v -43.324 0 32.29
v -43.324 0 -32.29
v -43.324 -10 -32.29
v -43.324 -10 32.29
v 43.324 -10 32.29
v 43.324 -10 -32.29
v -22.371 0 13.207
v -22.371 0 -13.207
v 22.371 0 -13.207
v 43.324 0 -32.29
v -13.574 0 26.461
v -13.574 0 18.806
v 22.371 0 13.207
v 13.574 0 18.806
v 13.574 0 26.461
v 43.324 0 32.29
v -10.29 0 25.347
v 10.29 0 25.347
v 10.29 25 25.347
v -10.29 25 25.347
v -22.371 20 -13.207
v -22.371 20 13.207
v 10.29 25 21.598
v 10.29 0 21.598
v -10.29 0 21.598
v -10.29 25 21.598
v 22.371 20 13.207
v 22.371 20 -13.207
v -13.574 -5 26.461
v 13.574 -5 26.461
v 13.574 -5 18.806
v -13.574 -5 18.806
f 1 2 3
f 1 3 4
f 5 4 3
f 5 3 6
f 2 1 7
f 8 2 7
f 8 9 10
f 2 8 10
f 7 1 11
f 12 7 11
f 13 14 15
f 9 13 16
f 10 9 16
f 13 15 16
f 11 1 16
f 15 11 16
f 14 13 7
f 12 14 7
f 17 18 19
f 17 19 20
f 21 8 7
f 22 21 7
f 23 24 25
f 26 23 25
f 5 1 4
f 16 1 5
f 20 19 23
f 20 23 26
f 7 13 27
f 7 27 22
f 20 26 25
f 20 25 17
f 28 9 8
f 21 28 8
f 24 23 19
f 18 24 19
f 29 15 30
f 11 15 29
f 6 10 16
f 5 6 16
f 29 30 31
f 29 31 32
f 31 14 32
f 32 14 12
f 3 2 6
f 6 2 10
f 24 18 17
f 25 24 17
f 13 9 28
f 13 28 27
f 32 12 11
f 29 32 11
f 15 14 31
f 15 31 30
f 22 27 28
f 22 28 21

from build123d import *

# Parameters (mm, degrees)
F0_W     = 86.649
F0_H     = 64.58047
F1_DEPTH = 10
F2_W     = 27.147728
F2_H     = 7.65556
F3_DEPTH = 5
F4_W     = 44.741262
F4_H     = 26.414666
F5_DEPTH = 20
F6_W     = 20.580796
F6_H     = 3.749348
F7_DEPTH = 25


with BuildPart() as f1:
    # F0 (on Front) → F1 (new body)
    with BuildSketch(Plane.XZ):
        Rectangle(F0_W, F0_H)
    extrude(amount=F1_DEPTH)

    # F2 (on face) → F3 (cut)
    with BuildSketch(Plane(origin=(0, 0, 0), x_dir=(-1, 0, 0), z_dir=(0, 1, 0))):
        with Locations((0, 22.633316)):
            Rectangle(F2_W, F2_H)
    extrude(amount=-F3_DEPTH, mode=Mode.SUBTRACT)

    # F4 (on face) → F5 (join)
    with BuildSketch(Plane(origin=(0, 0, 0), x_dir=(-1, 0, 0), z_dir=(0, 1, 0))):
        Rectangle(F4_W, F4_H)
    extrude(amount=F5_DEPTH)


with BuildPart() as f7:
    # F6 (on face) → F7 (new body)
    with BuildSketch(Plane(origin=(0, 0, 0), x_dir=(-1, 0, 0), z_dir=(0, 1, 0))):
        with Locations((0, 23.472328)):
            Rectangle(F6_W, F6_H)
    extrude(amount=F7_DEPTH)


solid = Compound([f1.part, f7.part])
